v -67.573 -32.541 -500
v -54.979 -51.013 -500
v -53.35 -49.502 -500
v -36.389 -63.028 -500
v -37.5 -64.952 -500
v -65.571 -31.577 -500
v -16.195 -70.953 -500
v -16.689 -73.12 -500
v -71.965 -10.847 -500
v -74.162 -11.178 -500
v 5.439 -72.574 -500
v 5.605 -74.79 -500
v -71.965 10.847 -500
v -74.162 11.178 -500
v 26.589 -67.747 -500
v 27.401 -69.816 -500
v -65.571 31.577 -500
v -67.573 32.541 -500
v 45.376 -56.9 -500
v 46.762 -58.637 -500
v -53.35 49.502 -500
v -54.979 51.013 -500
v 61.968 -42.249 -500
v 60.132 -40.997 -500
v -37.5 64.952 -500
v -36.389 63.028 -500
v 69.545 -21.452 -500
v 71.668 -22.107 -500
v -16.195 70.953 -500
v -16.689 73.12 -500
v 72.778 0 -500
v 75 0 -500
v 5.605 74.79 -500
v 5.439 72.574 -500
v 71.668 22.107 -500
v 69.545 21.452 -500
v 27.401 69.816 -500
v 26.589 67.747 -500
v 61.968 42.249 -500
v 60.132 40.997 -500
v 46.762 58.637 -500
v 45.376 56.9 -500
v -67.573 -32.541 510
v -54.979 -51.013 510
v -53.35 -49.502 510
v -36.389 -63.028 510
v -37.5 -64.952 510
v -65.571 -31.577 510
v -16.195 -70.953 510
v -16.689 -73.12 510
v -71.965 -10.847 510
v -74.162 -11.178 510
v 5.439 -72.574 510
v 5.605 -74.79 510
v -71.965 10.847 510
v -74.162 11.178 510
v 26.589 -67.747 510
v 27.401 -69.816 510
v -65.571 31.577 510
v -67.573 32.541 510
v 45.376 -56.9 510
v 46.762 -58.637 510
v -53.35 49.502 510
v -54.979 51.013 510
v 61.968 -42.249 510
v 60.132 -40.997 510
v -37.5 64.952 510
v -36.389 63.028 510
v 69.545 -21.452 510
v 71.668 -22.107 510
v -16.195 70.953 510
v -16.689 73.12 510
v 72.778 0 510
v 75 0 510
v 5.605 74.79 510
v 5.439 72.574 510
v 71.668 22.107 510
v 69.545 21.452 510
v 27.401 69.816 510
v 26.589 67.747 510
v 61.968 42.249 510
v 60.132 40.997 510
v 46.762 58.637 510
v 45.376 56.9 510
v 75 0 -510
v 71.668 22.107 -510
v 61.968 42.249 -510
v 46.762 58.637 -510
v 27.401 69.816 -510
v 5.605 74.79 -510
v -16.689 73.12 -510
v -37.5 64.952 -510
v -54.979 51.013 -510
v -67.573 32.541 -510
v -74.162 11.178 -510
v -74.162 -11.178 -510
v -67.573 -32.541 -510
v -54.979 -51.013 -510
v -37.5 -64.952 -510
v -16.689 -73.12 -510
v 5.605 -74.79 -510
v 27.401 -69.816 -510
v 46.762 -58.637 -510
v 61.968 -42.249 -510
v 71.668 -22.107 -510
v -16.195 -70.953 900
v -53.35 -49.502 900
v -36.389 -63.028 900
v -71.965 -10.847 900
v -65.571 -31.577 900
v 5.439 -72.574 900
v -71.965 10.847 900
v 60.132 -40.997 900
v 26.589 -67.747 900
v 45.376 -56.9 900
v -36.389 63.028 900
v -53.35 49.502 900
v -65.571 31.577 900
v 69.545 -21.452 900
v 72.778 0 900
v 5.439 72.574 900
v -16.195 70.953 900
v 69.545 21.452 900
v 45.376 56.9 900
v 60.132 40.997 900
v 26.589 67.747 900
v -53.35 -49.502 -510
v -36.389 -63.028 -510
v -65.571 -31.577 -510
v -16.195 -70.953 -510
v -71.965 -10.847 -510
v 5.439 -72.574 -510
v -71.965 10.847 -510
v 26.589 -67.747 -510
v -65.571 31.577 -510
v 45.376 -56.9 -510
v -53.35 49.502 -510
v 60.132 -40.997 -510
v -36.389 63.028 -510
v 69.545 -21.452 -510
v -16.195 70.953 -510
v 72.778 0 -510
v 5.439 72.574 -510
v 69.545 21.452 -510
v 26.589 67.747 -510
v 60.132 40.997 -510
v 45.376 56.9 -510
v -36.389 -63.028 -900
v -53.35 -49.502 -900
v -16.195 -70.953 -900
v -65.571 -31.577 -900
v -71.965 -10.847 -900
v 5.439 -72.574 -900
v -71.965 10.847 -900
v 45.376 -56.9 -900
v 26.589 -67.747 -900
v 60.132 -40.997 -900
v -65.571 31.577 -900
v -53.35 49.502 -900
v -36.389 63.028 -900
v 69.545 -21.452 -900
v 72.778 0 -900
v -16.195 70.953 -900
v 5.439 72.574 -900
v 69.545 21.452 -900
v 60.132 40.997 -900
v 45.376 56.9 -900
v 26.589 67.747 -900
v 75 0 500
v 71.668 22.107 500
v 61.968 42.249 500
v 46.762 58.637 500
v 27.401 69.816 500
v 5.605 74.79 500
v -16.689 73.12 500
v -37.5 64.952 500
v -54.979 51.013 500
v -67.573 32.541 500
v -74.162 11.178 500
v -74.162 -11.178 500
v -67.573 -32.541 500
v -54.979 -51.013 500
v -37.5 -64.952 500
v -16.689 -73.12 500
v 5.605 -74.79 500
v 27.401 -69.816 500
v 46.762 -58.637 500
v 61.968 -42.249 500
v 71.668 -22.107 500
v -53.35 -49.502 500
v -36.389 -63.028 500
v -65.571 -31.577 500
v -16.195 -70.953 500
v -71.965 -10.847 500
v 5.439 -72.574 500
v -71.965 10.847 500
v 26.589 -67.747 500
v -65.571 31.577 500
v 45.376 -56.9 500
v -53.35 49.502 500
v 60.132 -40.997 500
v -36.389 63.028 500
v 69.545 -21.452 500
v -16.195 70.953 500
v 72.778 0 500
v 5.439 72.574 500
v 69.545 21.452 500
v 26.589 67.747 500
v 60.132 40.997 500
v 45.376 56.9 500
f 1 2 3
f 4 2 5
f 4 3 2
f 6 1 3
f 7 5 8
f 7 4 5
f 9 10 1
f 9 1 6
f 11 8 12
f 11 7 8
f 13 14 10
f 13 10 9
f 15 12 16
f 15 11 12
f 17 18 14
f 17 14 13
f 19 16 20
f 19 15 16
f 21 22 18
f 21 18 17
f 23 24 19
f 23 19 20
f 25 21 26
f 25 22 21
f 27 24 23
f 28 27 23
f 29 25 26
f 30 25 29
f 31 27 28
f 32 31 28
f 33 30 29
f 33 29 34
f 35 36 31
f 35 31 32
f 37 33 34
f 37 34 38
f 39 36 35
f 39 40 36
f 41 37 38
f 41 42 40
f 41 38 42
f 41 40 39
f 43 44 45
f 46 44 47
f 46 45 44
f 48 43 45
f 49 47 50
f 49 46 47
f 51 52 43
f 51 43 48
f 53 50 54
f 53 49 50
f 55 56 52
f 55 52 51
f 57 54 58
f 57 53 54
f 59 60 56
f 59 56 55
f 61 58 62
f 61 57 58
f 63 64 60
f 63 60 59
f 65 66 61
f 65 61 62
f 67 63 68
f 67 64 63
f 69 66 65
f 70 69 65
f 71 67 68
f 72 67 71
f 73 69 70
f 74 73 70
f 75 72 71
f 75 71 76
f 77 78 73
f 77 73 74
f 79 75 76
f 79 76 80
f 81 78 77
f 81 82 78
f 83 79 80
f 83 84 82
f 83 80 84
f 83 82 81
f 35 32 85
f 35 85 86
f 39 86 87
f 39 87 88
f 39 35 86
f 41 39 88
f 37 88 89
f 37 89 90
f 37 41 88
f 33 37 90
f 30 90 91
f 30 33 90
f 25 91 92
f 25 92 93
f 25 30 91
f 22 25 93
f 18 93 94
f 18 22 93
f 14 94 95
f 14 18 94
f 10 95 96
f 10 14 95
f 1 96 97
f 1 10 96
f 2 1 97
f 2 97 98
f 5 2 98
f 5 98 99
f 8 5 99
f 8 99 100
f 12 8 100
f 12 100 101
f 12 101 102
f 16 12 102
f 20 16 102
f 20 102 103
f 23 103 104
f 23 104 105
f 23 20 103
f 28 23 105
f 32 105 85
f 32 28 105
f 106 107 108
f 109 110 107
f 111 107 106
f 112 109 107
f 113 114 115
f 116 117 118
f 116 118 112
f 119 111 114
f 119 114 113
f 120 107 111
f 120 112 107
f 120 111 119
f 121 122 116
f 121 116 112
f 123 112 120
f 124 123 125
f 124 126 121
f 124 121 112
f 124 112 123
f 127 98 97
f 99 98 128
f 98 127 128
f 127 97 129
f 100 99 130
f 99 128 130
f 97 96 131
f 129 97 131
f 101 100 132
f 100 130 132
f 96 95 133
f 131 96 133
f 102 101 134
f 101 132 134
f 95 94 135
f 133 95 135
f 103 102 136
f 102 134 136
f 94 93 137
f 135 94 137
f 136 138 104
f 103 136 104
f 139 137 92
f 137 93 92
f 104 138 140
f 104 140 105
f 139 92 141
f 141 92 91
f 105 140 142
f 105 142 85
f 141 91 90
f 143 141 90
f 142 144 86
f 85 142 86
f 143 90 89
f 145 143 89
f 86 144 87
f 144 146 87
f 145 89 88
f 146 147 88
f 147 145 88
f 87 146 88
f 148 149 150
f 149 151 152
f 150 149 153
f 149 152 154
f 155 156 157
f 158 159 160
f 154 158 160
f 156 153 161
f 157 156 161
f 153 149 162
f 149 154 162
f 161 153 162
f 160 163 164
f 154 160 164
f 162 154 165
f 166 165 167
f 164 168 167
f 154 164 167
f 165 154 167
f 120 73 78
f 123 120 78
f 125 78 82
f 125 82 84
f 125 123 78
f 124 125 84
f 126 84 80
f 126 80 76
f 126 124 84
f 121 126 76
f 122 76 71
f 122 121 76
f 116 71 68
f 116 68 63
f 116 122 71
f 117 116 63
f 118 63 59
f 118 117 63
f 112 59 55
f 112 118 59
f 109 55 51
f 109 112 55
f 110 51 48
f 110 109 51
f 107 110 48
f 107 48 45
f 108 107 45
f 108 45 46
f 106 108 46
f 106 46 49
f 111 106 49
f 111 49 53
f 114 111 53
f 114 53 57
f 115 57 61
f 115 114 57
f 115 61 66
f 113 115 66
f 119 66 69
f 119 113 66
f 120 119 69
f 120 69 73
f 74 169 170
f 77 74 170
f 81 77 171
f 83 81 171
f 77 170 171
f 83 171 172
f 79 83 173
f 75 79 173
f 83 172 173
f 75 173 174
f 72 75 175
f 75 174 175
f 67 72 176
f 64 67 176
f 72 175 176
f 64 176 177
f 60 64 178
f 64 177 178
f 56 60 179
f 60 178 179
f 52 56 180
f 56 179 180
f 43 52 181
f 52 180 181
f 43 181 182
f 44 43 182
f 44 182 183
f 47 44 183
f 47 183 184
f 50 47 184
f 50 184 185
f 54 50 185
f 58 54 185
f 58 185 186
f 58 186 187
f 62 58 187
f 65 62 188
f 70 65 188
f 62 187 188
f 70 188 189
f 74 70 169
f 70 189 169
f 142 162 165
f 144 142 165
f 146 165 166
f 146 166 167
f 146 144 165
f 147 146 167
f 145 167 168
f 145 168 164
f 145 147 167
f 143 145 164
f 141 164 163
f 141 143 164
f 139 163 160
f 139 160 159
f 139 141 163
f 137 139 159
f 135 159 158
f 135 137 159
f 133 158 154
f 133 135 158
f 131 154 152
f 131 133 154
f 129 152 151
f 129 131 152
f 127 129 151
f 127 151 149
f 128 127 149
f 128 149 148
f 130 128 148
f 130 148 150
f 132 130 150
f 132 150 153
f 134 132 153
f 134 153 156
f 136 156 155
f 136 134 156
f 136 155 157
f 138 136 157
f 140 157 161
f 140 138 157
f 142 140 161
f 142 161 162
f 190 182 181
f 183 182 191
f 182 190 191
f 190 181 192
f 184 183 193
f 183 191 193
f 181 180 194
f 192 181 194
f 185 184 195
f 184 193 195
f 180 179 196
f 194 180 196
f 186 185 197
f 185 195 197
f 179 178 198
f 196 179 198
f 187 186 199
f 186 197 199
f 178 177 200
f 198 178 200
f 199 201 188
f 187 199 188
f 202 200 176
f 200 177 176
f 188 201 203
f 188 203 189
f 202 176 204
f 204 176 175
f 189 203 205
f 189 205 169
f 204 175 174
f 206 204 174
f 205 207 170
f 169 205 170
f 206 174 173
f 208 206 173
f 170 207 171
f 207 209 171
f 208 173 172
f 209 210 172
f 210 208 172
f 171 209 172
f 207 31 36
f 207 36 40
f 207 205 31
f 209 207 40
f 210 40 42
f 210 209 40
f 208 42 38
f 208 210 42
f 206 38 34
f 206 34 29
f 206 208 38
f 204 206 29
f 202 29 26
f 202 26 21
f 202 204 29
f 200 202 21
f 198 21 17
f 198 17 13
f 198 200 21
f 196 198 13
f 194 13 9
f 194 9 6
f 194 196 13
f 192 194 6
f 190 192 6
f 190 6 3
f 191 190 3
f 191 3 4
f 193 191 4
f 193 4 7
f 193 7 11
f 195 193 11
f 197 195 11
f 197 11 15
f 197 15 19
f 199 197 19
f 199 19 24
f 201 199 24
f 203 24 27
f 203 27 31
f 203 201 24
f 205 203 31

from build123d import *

# Parameters (mm, degrees)
F0_R          = 72.778
F1_DEPTH      = 900
F1_DEPTH_BACK = 900
F3_R          = 75
F3_R_2        = 72.778
F4_DEPTH      = 10


# Not quite as in the source:
# - a pattern or mirror of a feature is missing from the dataset's text; its kind, count and spacing are read off the source's solid


with BuildPart() as f1:
    # F0 (on Top) → F1 (new body, two sides)
    with BuildSketch(Plane.XY) as f1_sk:
        Circle(F0_R)
    extrude(amount=F1_DEPTH)
    extrude(f1_sk.sketch, amount=-F1_DEPTH_BACK)

    # F3 (on offset) → F4 (join)
    with BuildSketch(Plane.XY.offset(500)):
        Circle(F3_R)
        Circle(F3_R_2, mode=Mode.SUBTRACT)
    f4 = extrude(amount=F4_DEPTH)

    # F4_copies: F4 across plane
    add(f4.mirror(Plane(origin=(0, 0, 0), x_dir=(-1, 0, 0), z_dir=(0, 0, -1))))


solid = f1.part
